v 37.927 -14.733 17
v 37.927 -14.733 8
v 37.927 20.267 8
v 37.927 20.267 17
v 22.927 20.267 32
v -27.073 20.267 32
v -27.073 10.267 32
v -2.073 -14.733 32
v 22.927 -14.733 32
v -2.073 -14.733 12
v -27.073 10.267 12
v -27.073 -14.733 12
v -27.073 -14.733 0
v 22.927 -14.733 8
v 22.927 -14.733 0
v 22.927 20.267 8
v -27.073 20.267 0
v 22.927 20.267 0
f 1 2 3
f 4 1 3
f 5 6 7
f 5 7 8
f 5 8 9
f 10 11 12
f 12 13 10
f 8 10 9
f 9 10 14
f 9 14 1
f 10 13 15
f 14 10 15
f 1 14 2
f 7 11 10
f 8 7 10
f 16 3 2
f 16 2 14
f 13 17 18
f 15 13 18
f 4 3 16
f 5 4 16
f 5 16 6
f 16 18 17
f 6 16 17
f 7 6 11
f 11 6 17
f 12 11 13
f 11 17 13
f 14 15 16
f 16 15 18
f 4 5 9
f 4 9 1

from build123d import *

# Parameters (mm, degrees)
SKETCH1_W           = 65
SKETCH1_H           = 35
BOSS_EXTRUDE1_DEPTH = 12
SKETCH2_W           = 15
SKETCH2_H           = 35
CUT_EXTRUDE1_DEPTH  = 8
BOSS_EXTRUDE3_DEPTH = 20
CUT_EXTRUDE2_DEPTH  = 41


with BuildPart() as part:
    # Sketch1 → Boss-Extrude1 (new body)
    with BuildSketch(Plane.XY):
        with Locations((5.427350427, 2.767094017)):
            Rectangle(SKETCH1_W, SKETCH1_H)
    extrude(amount=BOSS_EXTRUDE1_DEPTH)

    # Sketch2 → Cut-Extrude1 (cut)
    with BuildSketch(Plane(origin=(0, 0, 0), x_dir=(-1, 0, 0), z_dir=(0, 0, -1))):
        with Locations((-30.427350427, 2.767094017)):
            Rectangle(SKETCH2_W, SKETCH2_H)
    extrude(amount=-CUT_EXTRUDE1_DEPTH, mode=Mode.SUBTRACT)

    # Sketch3 → Boss-Extrude3 (add)
    with BuildSketch(Plane.XY.offset(12)):
        Polygon((-27.072649573, 20.267094017), (-27.072649573, 10.267094017), (-2.072649573, -14.732905983), (37.927350427, -14.732905983), (37.927350427, 20.267094017), align=None)
    extrude(amount=BOSS_EXTRUDE3_DEPTH)

    # Sketch4 → Cut-Extrude2 (cut)
    with BuildSketch(Plane.XZ.offset(14.732905983)):
        Polygon((37.927350427, 32), (22.927350427, 32), (37.927350427, 17), align=None)
    extrude(amount=-CUT_EXTRUDE2_DEPTH, mode=Mode.SUBTRACT)


solid = part.part
